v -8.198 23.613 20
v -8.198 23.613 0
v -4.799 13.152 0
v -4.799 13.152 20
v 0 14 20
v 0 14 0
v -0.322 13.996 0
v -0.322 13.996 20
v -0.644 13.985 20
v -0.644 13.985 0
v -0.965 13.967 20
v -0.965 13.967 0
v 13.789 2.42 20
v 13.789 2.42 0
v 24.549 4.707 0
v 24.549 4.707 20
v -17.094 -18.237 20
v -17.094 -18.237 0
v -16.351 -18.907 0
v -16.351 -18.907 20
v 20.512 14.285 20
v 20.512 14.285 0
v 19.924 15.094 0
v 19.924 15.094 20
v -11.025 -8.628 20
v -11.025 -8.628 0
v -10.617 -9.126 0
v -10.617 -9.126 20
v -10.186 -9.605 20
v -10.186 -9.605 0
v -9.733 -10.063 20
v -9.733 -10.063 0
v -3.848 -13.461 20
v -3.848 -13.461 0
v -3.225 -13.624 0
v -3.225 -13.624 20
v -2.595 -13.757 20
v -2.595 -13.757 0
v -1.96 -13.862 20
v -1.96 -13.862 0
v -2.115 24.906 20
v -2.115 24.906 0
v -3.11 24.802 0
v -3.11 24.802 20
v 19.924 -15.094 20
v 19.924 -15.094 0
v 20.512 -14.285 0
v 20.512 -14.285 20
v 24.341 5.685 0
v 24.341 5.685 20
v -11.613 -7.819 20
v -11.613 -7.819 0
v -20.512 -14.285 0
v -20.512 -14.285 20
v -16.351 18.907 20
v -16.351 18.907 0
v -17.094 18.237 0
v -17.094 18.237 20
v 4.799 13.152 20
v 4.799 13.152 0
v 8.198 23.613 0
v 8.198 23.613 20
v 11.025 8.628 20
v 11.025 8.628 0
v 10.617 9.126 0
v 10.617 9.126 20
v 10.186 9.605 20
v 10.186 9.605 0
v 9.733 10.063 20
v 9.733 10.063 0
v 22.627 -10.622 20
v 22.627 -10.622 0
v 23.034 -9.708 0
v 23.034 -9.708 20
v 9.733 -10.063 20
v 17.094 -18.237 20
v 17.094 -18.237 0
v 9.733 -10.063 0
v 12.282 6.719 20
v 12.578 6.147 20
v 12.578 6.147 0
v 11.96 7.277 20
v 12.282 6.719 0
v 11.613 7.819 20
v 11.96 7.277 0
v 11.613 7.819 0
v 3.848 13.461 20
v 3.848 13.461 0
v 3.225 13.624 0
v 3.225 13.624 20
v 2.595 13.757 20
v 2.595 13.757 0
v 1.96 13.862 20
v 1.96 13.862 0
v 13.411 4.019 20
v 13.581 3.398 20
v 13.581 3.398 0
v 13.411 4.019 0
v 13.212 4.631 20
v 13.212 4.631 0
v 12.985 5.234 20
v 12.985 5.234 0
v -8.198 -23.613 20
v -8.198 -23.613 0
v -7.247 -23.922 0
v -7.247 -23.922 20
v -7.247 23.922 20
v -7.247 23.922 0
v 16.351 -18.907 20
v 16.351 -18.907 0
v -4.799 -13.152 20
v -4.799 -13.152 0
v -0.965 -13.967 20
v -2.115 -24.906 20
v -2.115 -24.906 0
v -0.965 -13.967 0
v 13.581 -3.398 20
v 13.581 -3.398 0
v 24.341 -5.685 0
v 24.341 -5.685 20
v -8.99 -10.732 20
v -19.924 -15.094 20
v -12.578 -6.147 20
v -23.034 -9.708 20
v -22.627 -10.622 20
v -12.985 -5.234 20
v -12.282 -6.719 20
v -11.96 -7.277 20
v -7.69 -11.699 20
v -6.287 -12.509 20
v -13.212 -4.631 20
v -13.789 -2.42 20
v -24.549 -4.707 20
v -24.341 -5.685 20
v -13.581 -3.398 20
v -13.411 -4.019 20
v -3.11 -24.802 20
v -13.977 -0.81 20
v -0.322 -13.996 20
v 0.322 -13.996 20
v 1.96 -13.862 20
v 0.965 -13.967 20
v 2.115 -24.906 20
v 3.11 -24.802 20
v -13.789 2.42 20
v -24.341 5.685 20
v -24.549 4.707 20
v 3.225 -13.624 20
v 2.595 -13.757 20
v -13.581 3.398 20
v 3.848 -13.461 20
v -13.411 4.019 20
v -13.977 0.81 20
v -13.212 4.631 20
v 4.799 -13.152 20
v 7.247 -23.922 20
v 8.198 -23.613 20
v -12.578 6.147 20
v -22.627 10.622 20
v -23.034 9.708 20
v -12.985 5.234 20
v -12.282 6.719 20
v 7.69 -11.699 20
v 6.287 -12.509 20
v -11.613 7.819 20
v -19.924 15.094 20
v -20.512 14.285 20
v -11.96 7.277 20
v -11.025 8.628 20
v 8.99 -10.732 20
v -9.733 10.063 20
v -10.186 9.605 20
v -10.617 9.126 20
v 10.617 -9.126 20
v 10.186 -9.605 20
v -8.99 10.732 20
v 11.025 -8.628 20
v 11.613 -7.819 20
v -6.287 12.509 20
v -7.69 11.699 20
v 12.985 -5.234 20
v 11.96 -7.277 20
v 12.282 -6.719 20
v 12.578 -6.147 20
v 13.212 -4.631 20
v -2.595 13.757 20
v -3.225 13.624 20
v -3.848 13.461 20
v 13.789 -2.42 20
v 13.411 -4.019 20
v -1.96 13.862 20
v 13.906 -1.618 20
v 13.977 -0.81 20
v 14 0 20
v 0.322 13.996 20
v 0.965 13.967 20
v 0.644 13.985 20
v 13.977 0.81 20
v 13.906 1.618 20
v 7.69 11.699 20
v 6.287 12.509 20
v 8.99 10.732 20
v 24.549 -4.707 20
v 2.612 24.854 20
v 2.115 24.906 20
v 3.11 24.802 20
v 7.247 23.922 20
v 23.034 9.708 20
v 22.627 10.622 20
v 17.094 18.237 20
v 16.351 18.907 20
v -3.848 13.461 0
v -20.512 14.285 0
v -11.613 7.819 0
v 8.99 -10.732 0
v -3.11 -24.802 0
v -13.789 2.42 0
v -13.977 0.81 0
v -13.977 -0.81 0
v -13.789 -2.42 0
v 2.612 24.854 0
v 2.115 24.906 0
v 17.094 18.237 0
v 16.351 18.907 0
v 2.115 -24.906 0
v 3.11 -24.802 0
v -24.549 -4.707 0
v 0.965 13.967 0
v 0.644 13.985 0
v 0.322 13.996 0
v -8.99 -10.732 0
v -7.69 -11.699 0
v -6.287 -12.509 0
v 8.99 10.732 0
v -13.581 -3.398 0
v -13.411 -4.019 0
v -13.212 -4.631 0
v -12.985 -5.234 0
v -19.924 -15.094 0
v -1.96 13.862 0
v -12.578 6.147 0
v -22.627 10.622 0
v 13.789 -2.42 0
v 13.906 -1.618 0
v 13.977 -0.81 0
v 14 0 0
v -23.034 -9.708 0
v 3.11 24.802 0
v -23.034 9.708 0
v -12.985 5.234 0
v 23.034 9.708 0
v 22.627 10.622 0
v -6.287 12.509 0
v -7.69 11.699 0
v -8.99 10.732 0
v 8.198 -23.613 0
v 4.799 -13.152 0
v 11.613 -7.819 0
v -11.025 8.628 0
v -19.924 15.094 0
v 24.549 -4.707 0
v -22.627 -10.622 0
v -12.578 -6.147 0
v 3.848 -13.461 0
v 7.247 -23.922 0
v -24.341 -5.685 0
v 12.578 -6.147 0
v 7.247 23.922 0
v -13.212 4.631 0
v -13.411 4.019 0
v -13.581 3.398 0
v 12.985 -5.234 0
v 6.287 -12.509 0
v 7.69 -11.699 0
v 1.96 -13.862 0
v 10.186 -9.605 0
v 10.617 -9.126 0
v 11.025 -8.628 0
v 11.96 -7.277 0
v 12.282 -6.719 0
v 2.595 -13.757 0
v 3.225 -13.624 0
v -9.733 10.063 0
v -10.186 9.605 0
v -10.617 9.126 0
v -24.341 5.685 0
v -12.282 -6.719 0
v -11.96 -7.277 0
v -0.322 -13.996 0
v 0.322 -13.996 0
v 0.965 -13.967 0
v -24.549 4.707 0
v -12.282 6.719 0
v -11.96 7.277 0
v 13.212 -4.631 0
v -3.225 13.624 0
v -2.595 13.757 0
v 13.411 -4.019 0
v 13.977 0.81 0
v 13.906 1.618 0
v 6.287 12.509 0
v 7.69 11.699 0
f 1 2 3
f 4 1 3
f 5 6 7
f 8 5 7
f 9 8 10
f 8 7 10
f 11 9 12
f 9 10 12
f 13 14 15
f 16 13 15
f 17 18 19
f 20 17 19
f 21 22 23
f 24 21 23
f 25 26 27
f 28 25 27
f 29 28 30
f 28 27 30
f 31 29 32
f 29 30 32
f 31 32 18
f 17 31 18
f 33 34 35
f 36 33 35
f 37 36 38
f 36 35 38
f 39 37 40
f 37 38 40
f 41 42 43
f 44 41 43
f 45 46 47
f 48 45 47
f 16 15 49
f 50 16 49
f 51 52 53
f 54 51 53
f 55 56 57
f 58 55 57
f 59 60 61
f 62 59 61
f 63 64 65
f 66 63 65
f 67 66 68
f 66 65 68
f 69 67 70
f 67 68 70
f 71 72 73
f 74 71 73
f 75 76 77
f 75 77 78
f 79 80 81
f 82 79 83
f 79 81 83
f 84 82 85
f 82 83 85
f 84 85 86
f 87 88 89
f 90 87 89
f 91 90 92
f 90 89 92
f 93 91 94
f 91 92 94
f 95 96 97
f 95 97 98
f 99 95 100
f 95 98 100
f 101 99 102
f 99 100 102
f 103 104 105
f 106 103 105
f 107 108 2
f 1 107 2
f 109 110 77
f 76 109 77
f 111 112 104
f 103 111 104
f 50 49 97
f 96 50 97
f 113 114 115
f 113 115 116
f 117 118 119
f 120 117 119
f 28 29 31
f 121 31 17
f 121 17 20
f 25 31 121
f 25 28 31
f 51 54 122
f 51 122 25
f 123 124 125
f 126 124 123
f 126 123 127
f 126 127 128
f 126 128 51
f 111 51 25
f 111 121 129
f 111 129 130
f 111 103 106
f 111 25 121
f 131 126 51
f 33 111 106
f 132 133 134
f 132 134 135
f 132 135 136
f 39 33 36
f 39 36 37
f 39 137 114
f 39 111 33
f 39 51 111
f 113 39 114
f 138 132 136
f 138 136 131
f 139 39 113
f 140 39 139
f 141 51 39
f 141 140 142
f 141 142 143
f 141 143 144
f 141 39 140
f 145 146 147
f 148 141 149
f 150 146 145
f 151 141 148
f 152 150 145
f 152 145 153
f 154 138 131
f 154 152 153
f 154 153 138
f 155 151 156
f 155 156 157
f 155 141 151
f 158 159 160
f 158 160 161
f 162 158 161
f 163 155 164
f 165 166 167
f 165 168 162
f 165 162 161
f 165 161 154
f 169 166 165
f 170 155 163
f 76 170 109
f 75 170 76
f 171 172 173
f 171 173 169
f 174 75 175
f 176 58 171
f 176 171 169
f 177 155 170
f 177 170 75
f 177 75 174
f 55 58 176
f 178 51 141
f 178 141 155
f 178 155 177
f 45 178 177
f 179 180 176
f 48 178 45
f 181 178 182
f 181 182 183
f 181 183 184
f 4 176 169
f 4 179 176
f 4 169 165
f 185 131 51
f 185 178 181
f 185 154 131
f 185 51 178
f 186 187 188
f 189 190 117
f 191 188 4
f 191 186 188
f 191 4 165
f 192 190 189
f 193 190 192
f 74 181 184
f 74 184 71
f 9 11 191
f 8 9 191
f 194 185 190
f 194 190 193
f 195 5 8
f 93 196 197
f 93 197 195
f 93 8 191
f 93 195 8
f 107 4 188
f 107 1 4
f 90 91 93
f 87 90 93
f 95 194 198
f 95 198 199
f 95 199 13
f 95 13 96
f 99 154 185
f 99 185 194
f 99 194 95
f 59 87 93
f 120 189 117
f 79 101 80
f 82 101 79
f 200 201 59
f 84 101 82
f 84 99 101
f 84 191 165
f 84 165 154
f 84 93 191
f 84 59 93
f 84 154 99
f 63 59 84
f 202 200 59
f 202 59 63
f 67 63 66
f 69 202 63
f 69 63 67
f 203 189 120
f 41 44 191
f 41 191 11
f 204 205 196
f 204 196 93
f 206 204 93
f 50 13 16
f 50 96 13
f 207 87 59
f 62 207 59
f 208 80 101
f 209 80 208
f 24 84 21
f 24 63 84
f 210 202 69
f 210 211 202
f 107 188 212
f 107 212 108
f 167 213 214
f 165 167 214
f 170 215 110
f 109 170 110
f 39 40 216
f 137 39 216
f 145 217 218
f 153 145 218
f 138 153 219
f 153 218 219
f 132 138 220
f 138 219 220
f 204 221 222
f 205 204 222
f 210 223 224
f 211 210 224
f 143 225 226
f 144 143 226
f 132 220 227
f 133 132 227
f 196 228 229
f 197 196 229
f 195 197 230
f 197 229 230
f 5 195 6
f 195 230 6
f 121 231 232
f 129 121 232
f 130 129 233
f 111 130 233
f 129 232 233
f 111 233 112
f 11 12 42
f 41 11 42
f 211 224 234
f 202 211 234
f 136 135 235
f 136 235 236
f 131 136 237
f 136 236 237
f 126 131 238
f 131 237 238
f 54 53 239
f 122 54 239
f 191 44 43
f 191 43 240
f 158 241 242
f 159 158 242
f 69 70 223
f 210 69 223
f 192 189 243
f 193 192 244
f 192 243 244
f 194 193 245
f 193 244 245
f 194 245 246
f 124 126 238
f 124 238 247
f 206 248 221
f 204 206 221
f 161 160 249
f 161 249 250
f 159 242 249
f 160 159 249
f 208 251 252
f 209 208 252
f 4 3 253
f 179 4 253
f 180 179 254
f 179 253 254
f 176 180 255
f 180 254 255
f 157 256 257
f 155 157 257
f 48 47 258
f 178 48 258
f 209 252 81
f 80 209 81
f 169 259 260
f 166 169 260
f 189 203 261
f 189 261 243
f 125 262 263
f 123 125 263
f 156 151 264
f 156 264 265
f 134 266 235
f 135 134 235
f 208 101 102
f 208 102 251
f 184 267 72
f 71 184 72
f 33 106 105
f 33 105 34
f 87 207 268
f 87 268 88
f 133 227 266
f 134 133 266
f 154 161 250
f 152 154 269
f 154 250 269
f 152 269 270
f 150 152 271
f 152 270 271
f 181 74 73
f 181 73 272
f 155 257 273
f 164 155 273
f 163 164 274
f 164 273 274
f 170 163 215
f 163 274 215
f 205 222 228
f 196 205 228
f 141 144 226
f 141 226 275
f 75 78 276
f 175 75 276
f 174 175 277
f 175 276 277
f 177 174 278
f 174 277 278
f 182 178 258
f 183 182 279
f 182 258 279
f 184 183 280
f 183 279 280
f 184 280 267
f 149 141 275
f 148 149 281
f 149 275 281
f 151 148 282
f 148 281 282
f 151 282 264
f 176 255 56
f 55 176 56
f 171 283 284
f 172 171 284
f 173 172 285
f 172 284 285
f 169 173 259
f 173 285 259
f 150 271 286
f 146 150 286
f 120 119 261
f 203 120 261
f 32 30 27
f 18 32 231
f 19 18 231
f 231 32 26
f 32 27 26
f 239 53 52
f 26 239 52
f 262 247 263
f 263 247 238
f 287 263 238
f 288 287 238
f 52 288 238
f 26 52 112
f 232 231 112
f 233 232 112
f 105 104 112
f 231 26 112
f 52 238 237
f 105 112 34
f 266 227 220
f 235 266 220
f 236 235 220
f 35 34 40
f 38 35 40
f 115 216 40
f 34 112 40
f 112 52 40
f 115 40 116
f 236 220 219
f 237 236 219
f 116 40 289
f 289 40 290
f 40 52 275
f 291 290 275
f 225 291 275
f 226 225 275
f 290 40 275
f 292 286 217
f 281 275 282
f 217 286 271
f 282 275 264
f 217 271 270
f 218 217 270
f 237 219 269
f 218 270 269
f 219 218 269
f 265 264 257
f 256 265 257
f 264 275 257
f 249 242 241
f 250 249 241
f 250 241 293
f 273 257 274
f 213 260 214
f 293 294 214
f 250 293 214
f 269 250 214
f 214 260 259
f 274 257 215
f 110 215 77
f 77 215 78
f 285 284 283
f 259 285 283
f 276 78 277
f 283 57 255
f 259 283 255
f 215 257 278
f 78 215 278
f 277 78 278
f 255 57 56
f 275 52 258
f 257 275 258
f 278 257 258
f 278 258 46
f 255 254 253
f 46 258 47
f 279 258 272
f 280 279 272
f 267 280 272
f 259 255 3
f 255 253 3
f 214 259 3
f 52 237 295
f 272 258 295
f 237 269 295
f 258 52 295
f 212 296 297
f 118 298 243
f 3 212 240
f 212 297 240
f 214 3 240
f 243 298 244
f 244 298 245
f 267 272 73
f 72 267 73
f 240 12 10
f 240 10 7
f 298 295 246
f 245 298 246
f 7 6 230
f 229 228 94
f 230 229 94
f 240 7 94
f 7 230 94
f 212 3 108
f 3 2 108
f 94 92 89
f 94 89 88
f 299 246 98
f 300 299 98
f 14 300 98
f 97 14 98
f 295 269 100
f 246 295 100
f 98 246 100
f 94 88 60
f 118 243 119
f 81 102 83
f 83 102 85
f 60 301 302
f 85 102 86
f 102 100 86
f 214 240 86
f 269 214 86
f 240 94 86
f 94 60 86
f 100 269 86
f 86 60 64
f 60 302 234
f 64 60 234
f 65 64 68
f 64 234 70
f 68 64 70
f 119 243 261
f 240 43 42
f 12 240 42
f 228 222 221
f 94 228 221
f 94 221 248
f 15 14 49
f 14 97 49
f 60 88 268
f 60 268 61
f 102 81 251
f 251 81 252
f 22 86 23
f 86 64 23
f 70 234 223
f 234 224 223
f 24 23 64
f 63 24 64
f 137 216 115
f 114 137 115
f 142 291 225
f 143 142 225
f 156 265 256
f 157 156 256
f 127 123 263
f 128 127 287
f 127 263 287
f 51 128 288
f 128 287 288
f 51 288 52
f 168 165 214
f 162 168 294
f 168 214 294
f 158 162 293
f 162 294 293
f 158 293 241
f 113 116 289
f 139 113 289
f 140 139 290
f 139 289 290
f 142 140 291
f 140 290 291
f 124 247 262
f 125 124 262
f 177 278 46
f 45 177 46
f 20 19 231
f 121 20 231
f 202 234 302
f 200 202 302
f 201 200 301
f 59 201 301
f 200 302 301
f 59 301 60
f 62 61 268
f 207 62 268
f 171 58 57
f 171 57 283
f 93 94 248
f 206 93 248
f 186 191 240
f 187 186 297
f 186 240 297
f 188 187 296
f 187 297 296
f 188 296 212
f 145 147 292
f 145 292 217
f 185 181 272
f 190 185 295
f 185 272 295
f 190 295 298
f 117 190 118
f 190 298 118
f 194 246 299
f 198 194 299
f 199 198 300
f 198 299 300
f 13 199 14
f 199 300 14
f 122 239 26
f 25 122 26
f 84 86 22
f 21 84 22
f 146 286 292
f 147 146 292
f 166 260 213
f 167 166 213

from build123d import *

# Parameters (mm, degrees)
F1_DEPTH = 20


with BuildPart() as f1:
    # F0 (on Top) → F1 (new body)
    with BuildSketch(Plane.XY):
        with BuildLine():
            ThreePointArc((13.7892860083, -2.4198329244), (13.9472220194, -1.2144949329), (14, 0))
            ThreePointArc((14, 0), (13.9472220194, 1.2144949329), (13.7892860083, 2.4198329244))
            ThreePointArc((13.7892860083, 2.4198329244), (13.6940664103, 2.9107636714), (13.5813743175, 3.3979805251))
            ThreePointArc((13.5813743175, 3.3979805251), (13.3147912281, 4.3262379212), (12.98484547, 5.2339075383))
            ThreePointArc((12.98484547, 5.2339075383), (12.789636407, 5.6943130031), (12.578108827, 6.1474529959))
            ThreePointArc((12.578108827, 6.1474529959), (12.124355653, 7), (11.6129048765, 7.8192352777))
            ThreePointArc((11.6129048765, 7.8192352777), (11.3262379212, 8.2289935321), (11.0251196242, 8.6282522721))
            ThreePointArc((11.0251196242, 8.6282522721), (10.4040275567, 9.367828489), (9.733424615, 10.0628249147))
            ThreePointArc((9.733424615, 10.0628249147), (9.367828489, 10.4040275567), (8.9902797896, 10.731955521))
            ThreePointArc((8.9902797896, 10.731955521), (7, 12.124355653), (4.7990062187, 13.1517884454))
            ThreePointArc((4.7990062187, 13.1517884454), (4.3262379212, 13.3147912281), (3.8479497024, 13.4608054398))
            ThreePointArc((3.8479497024, 13.4608054398), (2.9107636714, 13.6940664103), (1.9597258458, 13.8621598104))
            Line((1.9597258458, 13.8621598104), (0.9652039504, 13.9666882737))
            ThreePointArc((0.9652039504, 13.9666882737), (0.4828893085, 13.99166959), (0, 14))
            ThreePointArc((0, 14), (-0.4828893085, 13.99166959), (-0.9652039504, 13.9666882737))
            ThreePointArc((-0.9652039504, 13.9666882737), (-1.4633984857, 13.9233065352), (-1.9597258458, 13.8621598104))
            ThreePointArc((-1.9597258458, 13.8621598104), (-2.9107636714, 13.6940664103), (-3.8479497024, 13.4608054398))
            ThreePointArc((-3.8479497024, 13.4608054398), (-4.3262379212, 13.3147912281), (-4.7990062187, 13.1517884454))
            ThreePointArc((-4.7990062187, 13.1517884454), (-7, 12.124355653), (-8.9902797896, 10.731955521))
            ThreePointArc((-8.9902797896, 10.731955521), (-9.367828489, 10.4040275567), (-9.733424615, 10.0628249147))
            ThreePointArc((-9.733424615, 10.0628249147), (-10.4040275567, 9.367828489), (-11.0251196242, 8.6282522721))
            ThreePointArc((-11.0251196242, 8.6282522721), (-11.3262379212, 8.2289935321), (-11.6129048765, 7.8192352777))
            ThreePointArc((-11.6129048765, 7.8192352777), (-12.124355653, 7), (-12.578108827, 6.1474529959))
            ThreePointArc((-12.578108827, 6.1474529959), (-12.789636407, 5.6943130031), (-12.98484547, 5.2339075383))
            ThreePointArc((-12.98484547, 5.2339075383), (-13.3147912281, 4.3262379212), (-13.5813743175, 3.3979805251))
            ThreePointArc((-13.5813743175, 3.3979805251), (-13.6940664103, 2.9107636714), (-13.7892860083, 2.4198329244))
            ThreePointArc((-13.7892860083, 2.4198329244), (-14, 0), (-13.7892860083, -2.4198329244))
            ThreePointArc((-13.7892860083, -2.4198329244), (-13.6940664103, -2.9107636714), (-13.5813743175, -3.3979805251))
            ThreePointArc((-13.5813743175, -3.3979805251), (-13.3147912281, -4.3262379212), (-12.98484547, -5.2339075383))
            ThreePointArc((-12.98484547, -5.2339075383), (-12.789636407, -5.6943130031), (-12.578108827, -6.1474529959))
            ThreePointArc((-12.578108827, -6.1474529959), (-12.124355653, -7), (-11.6129048765, -7.8192352777))
            ThreePointArc((-11.6129048765, -7.8192352777), (-11.3262379212, -8.2289935321), (-11.0251196242, -8.6282522721))
            ThreePointArc((-11.0251196242, -8.6282522721), (-10.4040275567, -9.367828489), (-9.733424615, -10.0628249147))
            ThreePointArc((-9.733424615, -10.0628249147), (-9.367828489, -10.4040275567), (-8.9902797896, -10.731955521))
            ThreePointArc((-8.9902797896, -10.731955521), (-7, -12.124355653), (-4.7990062187, -13.1517884454))
            ThreePointArc((-4.7990062187, -13.1517884454), (-4.3262379212, -13.3147912281), (-3.8479497024, -13.4608054398))
            ThreePointArc((-3.8479497024, -13.4608054398), (-2.9107636714, -13.6940664103), (-1.9597258458, -13.8621598104))
            ThreePointArc((-1.9597258458, -13.8621598104), (-1.4633984857, -13.9233065352), (-0.9652039504, -13.9666882737))
            ThreePointArc((-0.9652039504, -13.9666882737), (0, -14), (0.9652039504, -13.9666882737))
            ThreePointArc((0.9652039504, -13.9666882737), (1.4633984857, -13.9233065352), (1.9597258458, -13.8621598104))
            ThreePointArc((1.9597258458, -13.8621598104), (2.9107636714, -13.6940664103), (3.8479497024, -13.4608054398))
            ThreePointArc((3.8479497024, -13.4608054398), (4.3262379212, -13.3147912281), (4.7990062187, -13.1517884454))
            ThreePointArc((4.7990062187, -13.1517884454), (7, -12.124355653), (8.9902797896, -10.731955521))
            ThreePointArc((8.9902797896, -10.731955521), (9.367828489, -10.4040275567), (9.733424615, -10.0628249147))
            ThreePointArc((9.733424615, -10.0628249147), (10.4040275567, -9.367828489), (11.0251196242, -8.6282522721))
            ThreePointArc((11.0251196242, -8.6282522721), (11.3262379212, -8.2289935321), (11.6129048765, -7.8192352777))
            ThreePointArc((11.6129048765, -7.8192352777), (12.124355653, -7), (12.578108827, -6.1474529959))
            ThreePointArc((12.578108827, -6.1474529959), (12.789636407, -5.6943130031), (12.98484547, -5.2339075383))
            ThreePointArc((12.98484547, -5.2339075383), (13.3147912281, -4.3262379212), (13.5813743175, -3.3979805251))
            ThreePointArc((13.5813743175, -3.3979805251), (13.6940664103, -2.9107636714), (13.7892860083, -2.4198329244))
        make_face()
        with BuildLine():
            ThreePointArc((13.5813743175, 3.3979805251), (13.6940664103, 2.9107636714), (13.7892860083, 2.4198329244))
            Line((13.7892860083, 2.4198329244), (24.5489096164, 4.7068615234))
            Line((24.5489096164, 4.7068615234), (24.3409979255, 5.6850091241))
            Line((24.3409979255, 5.6850091241), (13.5813743175, 3.3979805251))
        make_face()
        with BuildLine():
            Line((24.5489096164, -4.7068615234), (13.7892860083, -2.4198329244))
            ThreePointArc((13.7892860083, -2.4198329244), (13.6940664103, -2.9107636714), (13.5813743175, -3.3979805251))
            Line((13.5813743175, -3.3979805251), (24.3409979255, -5.6850091241))
            Line((24.3409979255, -5.6850091241), (24.5489096164, -4.7068615234))
        make_face()
        with BuildLine():
            ThreePointArc((12.578108827, 6.1474529959), (12.789636407, 5.6943130031), (12.98484547, 5.2339075383))
            Line((12.98484547, 5.2339075383), (23.0338455041, 9.7080106121))
            Line((23.0338455041, 9.7080106121), (22.627108861, 10.6215560698))
            Line((22.627108861, 10.6215560698), (12.578108827, 6.1474529959))
        make_face()
        with BuildLine():
            Line((23.0338455041, -9.7080106121), (12.98484547, -5.2339075383))
            ThreePointArc((12.98484547, -5.2339075383), (12.789636407, -5.6943130031), (12.578108827, -6.1474529959))
            Line((12.578108827, -6.1474529959), (22.627108861, -10.6215560698))
            Line((22.627108861, -10.6215560698), (23.0338455041, -9.7080106121))
        make_face()
        with BuildLine():
            ThreePointArc((11.0251196242, 8.6282522721), (11.3262379212, 8.2289935321), (11.6129048765, 7.8192352777))
            Line((11.6129048765, 7.8192352777), (20.5120918147, 14.284873053))
            Line((20.5120918147, 14.284873053), (19.9243065624, 15.0938900473))
            Line((19.9243065624, 15.0938900473), (11.0251196242, 8.6282522721))
        make_face()
        with BuildLine():
            Line((20.5120918147, -14.284873053), (11.6129048765, -7.8192352777))
            ThreePointArc((11.6129048765, -7.8192352777), (11.3262379212, -8.2289935321), (11.0251196242, -8.6282522721))
            Line((11.0251196242, -8.6282522721), (19.9243065624, -15.0938900473))
            Line((19.9243065624, -15.0938900473), (20.5120918147, -14.284873053))
        make_face()
        with BuildLine():
            ThreePointArc((8.9902797896, 10.731955521), (9.367828489, 10.4040275567), (9.733424615, 10.0628249147))
            Line((9.733424615, 10.0628249147), (17.093861285, 18.2374179949))
            Line((17.093861285, 18.2374179949), (16.3507164595, 18.9065486013))
            Line((16.3507164595, 18.9065486013), (8.9902797896, 10.731955521))
        make_face()
        with BuildLine():
            Line((17.093861285, -18.2374179949), (9.733424615, -10.0628249147))
            ThreePointArc((9.733424615, -10.0628249147), (9.367828489, -10.4040275567), (8.9902797896, -10.731955521))
            Line((8.9902797896, -10.731955521), (16.3507164595, -18.9065486013))
            Line((16.3507164595, -18.9065486013), (17.093861285, -18.2374179949))
        make_face()
        with BuildLine():
            ThreePointArc((3.8479497024, 13.4608054398), (4.3262379212, 13.3147912281), (4.7990062187, 13.1517884454))
            Line((4.7990062187, 13.1517884454), (8.1981931568, 23.6134101247))
            Line((8.1981931568, 23.6134101247), (7.2471366405, 23.922427119))
            Line((7.2471366405, 23.922427119), (3.8479497024, 13.4608054398))
        make_face()
        with BuildLine():
            Line((8.1981931568, -23.6134101247), (4.7990062187, -13.1517884454))
            ThreePointArc((4.7990062187, -13.1517884454), (4.3262379212, -13.3147912281), (3.8479497024, -13.4608054398))
            Line((3.8479497024, -13.4608054398), (7.2471366405, -23.922427119))
            Line((7.2471366405, -23.922427119), (8.1981931568, -23.6134101247))
        make_face()
        with BuildLine():
            Line((0.9652039504, 13.9666882737), (1.9597258458, 13.8621598104))
            ThreePointArc((1.9597258458, 13.8621598104), (1.7118352075, 13.8949494502), (1.4633984857, 13.9233065352))
            ThreePointArc((1.4633984857, 13.9233065352), (1.2144949329, 13.9472220194), (0.9652039504, 13.9666882737))
        make_face()
        with BuildLine():
            ThreePointArc((1.4633984857, 13.9233065352), (1.7118352075, 13.8949494502), (1.9597258458, 13.8621598104))
            Line((1.9597258458, 13.8621598104), (3.1095389417, 24.8019006595))
            Line((3.1095389417, 24.8019006595), (2.612277994, 24.8541648911))
            Line((2.612277994, 24.8541648911), (1.4633984857, 13.9233065352))
        make_face()
        with BuildLine():
            Line((3.1095389417, -24.8019006595), (1.9597258458, -13.8621598104))
            ThreePointArc((1.9597258458, -13.8621598104), (1.4633984857, -13.9233065352), (0.9652039504, -13.9666882737))
            Line((0.9652039504, -13.9666882737), (2.1150170464, -24.9064291227))
            Line((2.1150170464, -24.9064291227), (3.1095389417, -24.8019006595))
        make_face()
        with BuildLine():
            ThreePointArc((0.9652039504, 13.9666882737), (1.2144949329, 13.9472220194), (1.4633984857, 13.9233065352))
            Line((1.4633984857, 13.9233065352), (2.612277994, 24.8541648911))
            Line((2.612277994, 24.8541648911), (2.1150170464, 24.9064291227))
            Line((2.1150170464, 24.9064291227), (0.9652039504, 13.9666882737))
        make_face()
        with BuildLine():
            Line((-2.1150170464, -24.9064291227), (-0.9652039504, -13.9666882737))
            ThreePointArc((-0.9652039504, -13.9666882737), (-1.4633984857, -13.9233065352), (-1.9597258458, -13.8621598104))
            Line((-1.9597258458, -13.8621598104), (-3.1095389417, -24.8019006595))
            Line((-3.1095389417, -24.8019006595), (-2.1150170464, -24.9064291227))
        make_face()
        with BuildLine():
            ThreePointArc((-1.9597258458, 13.8621598104), (-1.4633984857, 13.9233065352), (-0.9652039504, 13.9666882737))
            Line((-0.9652039504, 13.9666882737), (-2.1150170464, 24.9064291227))
            Line((-2.1150170464, 24.9064291227), (-3.1095389417, 24.8019006595))
            Line((-3.1095389417, 24.8019006595), (-1.9597258458, 13.8621598104))
        make_face()
        with BuildLine():
            Line((-7.2471366405, -23.922427119), (-3.8479497024, -13.4608054398))
            ThreePointArc((-3.8479497024, -13.4608054398), (-4.3262379212, -13.3147912281), (-4.7990062187, -13.1517884454))
            Line((-4.7990062187, -13.1517884454), (-8.1981931568, -23.6134101247))
            Line((-8.1981931568, -23.6134101247), (-7.2471366405, -23.922427119))
        make_face()
        with BuildLine():
            ThreePointArc((-4.7990062187, 13.1517884454), (-4.3262379212, 13.3147912281), (-3.8479497024, 13.4608054398))
            Line((-3.8479497024, 13.4608054398), (-7.2471366405, 23.922427119))
            Line((-7.2471366405, 23.922427119), (-8.1981931568, 23.6134101247))
            Line((-8.1981931568, 23.6134101247), (-4.7990062187, 13.1517884454))
        make_face()
        with BuildLine():
            Line((-16.3507164595, -18.9065486013), (-8.9902797896, -10.731955521))
            ThreePointArc((-8.9902797896, -10.731955521), (-9.367828489, -10.4040275567), (-9.733424615, -10.0628249147))
            Line((-9.733424615, -10.0628249147), (-17.093861285, -18.2374179949))
            Line((-17.093861285, -18.2374179949), (-16.3507164595, -18.9065486013))
        make_face()
        with BuildLine():
            ThreePointArc((-9.733424615, 10.0628249147), (-9.367828489, 10.4040275567), (-8.9902797896, 10.731955521))
            Line((-8.9902797896, 10.731955521), (-16.3507164595, 18.9065486013))
            Line((-16.3507164595, 18.9065486013), (-17.093861285, 18.2374179949))
            Line((-17.093861285, 18.2374179949), (-9.733424615, 10.0628249147))
        make_face()
        with BuildLine():
            Line((-19.9243065624, -15.0938900473), (-11.0251196242, -8.6282522721))
            ThreePointArc((-11.0251196242, -8.6282522721), (-11.3262379212, -8.2289935321), (-11.6129048765, -7.8192352777))
            Line((-11.6129048765, -7.8192352777), (-20.5120918147, -14.284873053))
            Line((-20.5120918147, -14.284873053), (-19.9243065624, -15.0938900473))
        make_face()
        with BuildLine():
            ThreePointArc((-11.6129048765, 7.8192352777), (-11.3262379212, 8.2289935321), (-11.0251196242, 8.6282522721))
            Line((-11.0251196242, 8.6282522721), (-19.9243065624, 15.0938900473))
            Line((-19.9243065624, 15.0938900473), (-20.5120918147, 14.284873053))
            Line((-20.5120918147, 14.284873053), (-11.6129048765, 7.8192352777))
        make_face()
        with BuildLine():
            Line((-22.627108861, -10.6215560698), (-12.578108827, -6.1474529959))
            ThreePointArc((-12.578108827, -6.1474529959), (-12.789636407, -5.6943130031), (-12.98484547, -5.2339075383))
            Line((-12.98484547, -5.2339075383), (-23.0338455041, -9.7080106121))
            Line((-23.0338455041, -9.7080106121), (-22.627108861, -10.6215560698))
        make_face()
        with BuildLine():
            ThreePointArc((-12.98484547, 5.2339075383), (-12.789636407, 5.6943130031), (-12.578108827, 6.1474529959))
            Line((-12.578108827, 6.1474529959), (-22.627108861, 10.6215560698))
            Line((-22.627108861, 10.6215560698), (-23.0338455041, 9.7080106121))
            Line((-23.0338455041, 9.7080106121), (-12.98484547, 5.2339075383))
        make_face()
        with BuildLine():
            Line((-24.3409979255, -5.6850091241), (-13.5813743175, -3.3979805251))
            ThreePointArc((-13.5813743175, -3.3979805251), (-13.6940664103, -2.9107636714), (-13.7892860083, -2.4198329244))
            Line((-13.7892860083, -2.4198329244), (-24.5489096164, -4.7068615234))
            Line((-24.5489096164, -4.7068615234), (-24.3409979255, -5.6850091241))
        make_face()
        with BuildLine():
            ThreePointArc((-13.7892860083, 2.4198329244), (-13.6940664103, 2.9107636714), (-13.5813743175, 3.3979805251))
            Line((-13.5813743175, 3.3979805251), (-24.3409979255, 5.6850091241))
            Line((-24.3409979255, 5.6850091241), (-24.5489096164, 4.7068615234))
            Line((-24.5489096164, 4.7068615234), (-13.7892860083, 2.4198329244))
        make_face()
    extrude(amount=F1_DEPTH)


solid = f1.part
